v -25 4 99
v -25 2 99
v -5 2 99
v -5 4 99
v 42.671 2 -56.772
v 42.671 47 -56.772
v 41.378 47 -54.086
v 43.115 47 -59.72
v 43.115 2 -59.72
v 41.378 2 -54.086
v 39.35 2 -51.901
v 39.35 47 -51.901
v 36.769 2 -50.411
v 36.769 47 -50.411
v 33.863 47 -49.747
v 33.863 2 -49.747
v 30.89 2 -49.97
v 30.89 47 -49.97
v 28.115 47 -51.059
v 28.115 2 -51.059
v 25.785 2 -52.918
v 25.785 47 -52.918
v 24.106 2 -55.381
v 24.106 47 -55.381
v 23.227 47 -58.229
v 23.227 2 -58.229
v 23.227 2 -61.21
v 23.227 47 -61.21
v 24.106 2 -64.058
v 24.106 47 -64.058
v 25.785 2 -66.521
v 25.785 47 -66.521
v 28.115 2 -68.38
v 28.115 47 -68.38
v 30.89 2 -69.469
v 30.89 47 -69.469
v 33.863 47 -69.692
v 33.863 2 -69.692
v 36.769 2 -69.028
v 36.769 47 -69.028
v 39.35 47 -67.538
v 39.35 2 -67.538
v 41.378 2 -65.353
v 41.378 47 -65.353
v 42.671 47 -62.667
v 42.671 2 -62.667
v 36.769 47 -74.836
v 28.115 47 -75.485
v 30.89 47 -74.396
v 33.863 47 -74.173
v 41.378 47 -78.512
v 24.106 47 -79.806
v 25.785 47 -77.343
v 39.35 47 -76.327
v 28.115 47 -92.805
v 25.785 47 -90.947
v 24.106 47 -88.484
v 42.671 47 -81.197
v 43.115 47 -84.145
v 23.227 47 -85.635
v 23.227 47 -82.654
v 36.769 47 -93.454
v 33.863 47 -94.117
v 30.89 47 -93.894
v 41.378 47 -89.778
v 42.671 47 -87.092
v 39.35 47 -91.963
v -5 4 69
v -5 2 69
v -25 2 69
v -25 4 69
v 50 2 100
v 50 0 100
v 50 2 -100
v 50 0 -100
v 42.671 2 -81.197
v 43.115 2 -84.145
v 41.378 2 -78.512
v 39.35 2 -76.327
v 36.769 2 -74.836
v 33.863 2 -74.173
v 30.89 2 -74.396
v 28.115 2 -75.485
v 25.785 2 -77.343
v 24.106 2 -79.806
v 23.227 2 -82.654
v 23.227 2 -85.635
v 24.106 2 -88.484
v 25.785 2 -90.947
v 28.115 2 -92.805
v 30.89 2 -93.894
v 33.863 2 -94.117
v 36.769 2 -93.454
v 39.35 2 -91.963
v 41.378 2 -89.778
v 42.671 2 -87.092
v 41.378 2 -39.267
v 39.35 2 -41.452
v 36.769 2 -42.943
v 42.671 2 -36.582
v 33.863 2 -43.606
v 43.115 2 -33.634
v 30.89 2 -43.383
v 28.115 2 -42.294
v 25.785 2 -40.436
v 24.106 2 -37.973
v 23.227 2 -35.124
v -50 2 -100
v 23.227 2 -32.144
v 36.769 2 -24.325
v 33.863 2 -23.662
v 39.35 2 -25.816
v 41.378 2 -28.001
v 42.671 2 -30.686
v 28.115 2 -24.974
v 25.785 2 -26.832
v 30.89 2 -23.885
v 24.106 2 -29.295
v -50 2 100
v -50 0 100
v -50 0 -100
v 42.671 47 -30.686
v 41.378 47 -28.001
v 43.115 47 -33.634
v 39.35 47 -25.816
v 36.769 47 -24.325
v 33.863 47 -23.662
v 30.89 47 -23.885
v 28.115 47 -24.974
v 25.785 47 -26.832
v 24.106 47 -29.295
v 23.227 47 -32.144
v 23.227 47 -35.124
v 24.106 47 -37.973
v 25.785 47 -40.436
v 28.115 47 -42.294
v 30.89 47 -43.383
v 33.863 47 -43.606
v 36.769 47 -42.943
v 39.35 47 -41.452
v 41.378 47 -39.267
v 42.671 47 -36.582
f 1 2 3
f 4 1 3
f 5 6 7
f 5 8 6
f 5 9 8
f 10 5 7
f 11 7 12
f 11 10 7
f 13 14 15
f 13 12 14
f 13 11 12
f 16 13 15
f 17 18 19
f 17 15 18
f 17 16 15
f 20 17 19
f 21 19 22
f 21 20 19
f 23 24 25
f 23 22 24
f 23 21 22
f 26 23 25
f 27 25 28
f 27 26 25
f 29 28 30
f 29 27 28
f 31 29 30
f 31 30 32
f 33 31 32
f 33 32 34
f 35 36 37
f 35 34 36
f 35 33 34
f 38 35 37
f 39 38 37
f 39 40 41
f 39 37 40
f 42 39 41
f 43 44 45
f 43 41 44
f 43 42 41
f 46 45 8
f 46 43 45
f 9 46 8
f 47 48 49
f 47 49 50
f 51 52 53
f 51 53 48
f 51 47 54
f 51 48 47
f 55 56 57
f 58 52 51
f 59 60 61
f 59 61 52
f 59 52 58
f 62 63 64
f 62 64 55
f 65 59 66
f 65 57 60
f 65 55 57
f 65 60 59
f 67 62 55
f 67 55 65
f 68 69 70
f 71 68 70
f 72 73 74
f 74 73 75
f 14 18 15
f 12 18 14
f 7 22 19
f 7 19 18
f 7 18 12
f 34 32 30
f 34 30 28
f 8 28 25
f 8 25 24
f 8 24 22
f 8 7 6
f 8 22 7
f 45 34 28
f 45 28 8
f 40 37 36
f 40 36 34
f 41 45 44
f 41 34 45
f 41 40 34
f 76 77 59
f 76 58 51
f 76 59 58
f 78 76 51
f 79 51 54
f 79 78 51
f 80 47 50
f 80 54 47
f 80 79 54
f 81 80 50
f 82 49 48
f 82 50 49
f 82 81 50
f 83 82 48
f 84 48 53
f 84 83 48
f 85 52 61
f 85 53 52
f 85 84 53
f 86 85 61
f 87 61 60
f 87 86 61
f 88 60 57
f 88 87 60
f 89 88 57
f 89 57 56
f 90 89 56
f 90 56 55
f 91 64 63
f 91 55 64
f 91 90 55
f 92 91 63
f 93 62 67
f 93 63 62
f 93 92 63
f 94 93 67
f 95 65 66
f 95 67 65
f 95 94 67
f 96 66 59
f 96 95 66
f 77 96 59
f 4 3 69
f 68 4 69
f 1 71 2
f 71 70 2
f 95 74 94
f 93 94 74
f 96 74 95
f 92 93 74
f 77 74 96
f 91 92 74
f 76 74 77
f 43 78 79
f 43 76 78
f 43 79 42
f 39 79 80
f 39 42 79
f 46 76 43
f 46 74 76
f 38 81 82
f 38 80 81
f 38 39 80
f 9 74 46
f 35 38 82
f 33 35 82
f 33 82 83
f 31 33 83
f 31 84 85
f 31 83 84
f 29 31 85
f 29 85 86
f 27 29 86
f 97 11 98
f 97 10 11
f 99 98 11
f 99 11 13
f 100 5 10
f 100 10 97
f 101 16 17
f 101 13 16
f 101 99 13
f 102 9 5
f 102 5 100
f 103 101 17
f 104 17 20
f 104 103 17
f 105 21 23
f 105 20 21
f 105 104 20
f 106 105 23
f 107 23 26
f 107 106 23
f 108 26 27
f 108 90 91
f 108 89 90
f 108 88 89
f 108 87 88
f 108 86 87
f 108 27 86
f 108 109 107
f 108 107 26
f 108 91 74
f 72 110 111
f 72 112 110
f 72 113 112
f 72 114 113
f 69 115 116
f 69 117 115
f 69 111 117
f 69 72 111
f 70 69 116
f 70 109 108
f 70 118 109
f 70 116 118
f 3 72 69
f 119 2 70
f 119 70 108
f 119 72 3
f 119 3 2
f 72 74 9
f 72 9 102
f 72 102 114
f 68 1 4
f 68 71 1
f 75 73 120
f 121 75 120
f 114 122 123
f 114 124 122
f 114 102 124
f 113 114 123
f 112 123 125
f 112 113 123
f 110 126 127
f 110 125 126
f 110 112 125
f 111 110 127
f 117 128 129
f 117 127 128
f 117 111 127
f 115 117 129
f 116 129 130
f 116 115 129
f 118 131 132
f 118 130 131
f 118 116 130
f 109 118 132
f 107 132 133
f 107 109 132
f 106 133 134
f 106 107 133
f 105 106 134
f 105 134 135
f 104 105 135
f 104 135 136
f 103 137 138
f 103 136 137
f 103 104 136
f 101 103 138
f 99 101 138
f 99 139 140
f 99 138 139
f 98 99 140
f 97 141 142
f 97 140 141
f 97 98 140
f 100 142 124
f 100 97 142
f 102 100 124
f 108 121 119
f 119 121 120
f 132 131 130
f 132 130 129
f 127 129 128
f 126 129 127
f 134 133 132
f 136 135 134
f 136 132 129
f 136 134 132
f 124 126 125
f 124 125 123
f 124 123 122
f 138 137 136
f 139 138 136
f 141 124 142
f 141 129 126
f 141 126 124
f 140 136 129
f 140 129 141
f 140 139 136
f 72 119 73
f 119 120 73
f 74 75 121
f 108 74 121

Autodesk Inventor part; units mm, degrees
ref_plane "YZ Plane" through (0, 0, 0) normal (1, 0, 0) x (0, 1, 0)
ref_plane "XZ Plane" through (0, 0, 0) normal (0, 1, 0) x (-1, 0, 0)
ref_plane "XY Plane" through (0, 0, 0) normal (0, 0, 1) x (1, 0, 0)
sketch "Sketch2" plane through (0, 0, 0) normal (0, 1, 0) x (-1, 0, 0)
  line L0 (-50, -100) -> (50, -100)
  line L1 (50, -100) -> (50, 100)
  line L2 (50, 100) -> (-50, 100)
  line L3 (-50, 100) -> (-50, -100)
  line L4 (-50, -100) -> (50, 100) construction
  line L5 (50, -100) -> (-50, 100) construction
  point P0 (0, 0)
  dimension "d0" = 200
  dimension "d1" = 100
extrude "Extrusion1" add sketch "Sketch2" along normal blind 2
sketch "Sketch3" plane through (0, 2, 0) normal (0, 1, 0) x (1, 0, 0)
  circle A0 centre (33.1152, 84.1449) radius 10
  circle A1 centre (33.1152, 59.7195) radius 10
  circle A2 centre (33.1152, 33.634) radius 10
  point P0 (0, 0)
  dimension "d4" = 20
  dimension "d5" = 20
  dimension "d6" = 20
extrude "Extrusion2" add sketch "Sketch3" along normal blind 45
sketch "Sketch4" plane through (0, 2, 0) normal (0, 1, 0) x (1, 0, 0)
  line L0 (-25, -99) -> (-5, -99)
  line L1 (-5, -99) -> (-5, -69)
  line L2 (-5, -69) -> (-25, -69)
  line L3 (-25, -69) -> (-25, -99)
  line L4 (-25, -99) -> (-5, -69) construction
  line L5 (-5, -99) -> (-25, -69) construction
  line L6 (-50, 100) -> (-50, -100) projected
  line L7 (-50, -100) -> (50, -100) projected
  point P0 (0, 0)
  point P1 (-15, -84)
  dimension "d9" = 25
  dimension "d10" = 45
  dimension "d11" = 30
  dimension "d12" = 1
extrude "Extrusion3" add sketch "Sketch4" along normal blind 2
equation "\"BendRadius\" = Thickness"
equation "\"BendReliefWidth\" = Thickness"
equation "\"BendReliefDepth\" = 0.5 * Thickness"
equation "\"CornerReliefSize\" = 4 * Thickness"
equation "\"MinimumRemnant\" = 2 * Thickness"
equation "\"TransitionRadius\" = BendRadius"
equation "\"JacobiRadiusSize\" = BendRadius"
equation "\"GapSize\" = Thickness"
equation "\"Thickness\" = 3.048"
properties part number "modelo placa"
